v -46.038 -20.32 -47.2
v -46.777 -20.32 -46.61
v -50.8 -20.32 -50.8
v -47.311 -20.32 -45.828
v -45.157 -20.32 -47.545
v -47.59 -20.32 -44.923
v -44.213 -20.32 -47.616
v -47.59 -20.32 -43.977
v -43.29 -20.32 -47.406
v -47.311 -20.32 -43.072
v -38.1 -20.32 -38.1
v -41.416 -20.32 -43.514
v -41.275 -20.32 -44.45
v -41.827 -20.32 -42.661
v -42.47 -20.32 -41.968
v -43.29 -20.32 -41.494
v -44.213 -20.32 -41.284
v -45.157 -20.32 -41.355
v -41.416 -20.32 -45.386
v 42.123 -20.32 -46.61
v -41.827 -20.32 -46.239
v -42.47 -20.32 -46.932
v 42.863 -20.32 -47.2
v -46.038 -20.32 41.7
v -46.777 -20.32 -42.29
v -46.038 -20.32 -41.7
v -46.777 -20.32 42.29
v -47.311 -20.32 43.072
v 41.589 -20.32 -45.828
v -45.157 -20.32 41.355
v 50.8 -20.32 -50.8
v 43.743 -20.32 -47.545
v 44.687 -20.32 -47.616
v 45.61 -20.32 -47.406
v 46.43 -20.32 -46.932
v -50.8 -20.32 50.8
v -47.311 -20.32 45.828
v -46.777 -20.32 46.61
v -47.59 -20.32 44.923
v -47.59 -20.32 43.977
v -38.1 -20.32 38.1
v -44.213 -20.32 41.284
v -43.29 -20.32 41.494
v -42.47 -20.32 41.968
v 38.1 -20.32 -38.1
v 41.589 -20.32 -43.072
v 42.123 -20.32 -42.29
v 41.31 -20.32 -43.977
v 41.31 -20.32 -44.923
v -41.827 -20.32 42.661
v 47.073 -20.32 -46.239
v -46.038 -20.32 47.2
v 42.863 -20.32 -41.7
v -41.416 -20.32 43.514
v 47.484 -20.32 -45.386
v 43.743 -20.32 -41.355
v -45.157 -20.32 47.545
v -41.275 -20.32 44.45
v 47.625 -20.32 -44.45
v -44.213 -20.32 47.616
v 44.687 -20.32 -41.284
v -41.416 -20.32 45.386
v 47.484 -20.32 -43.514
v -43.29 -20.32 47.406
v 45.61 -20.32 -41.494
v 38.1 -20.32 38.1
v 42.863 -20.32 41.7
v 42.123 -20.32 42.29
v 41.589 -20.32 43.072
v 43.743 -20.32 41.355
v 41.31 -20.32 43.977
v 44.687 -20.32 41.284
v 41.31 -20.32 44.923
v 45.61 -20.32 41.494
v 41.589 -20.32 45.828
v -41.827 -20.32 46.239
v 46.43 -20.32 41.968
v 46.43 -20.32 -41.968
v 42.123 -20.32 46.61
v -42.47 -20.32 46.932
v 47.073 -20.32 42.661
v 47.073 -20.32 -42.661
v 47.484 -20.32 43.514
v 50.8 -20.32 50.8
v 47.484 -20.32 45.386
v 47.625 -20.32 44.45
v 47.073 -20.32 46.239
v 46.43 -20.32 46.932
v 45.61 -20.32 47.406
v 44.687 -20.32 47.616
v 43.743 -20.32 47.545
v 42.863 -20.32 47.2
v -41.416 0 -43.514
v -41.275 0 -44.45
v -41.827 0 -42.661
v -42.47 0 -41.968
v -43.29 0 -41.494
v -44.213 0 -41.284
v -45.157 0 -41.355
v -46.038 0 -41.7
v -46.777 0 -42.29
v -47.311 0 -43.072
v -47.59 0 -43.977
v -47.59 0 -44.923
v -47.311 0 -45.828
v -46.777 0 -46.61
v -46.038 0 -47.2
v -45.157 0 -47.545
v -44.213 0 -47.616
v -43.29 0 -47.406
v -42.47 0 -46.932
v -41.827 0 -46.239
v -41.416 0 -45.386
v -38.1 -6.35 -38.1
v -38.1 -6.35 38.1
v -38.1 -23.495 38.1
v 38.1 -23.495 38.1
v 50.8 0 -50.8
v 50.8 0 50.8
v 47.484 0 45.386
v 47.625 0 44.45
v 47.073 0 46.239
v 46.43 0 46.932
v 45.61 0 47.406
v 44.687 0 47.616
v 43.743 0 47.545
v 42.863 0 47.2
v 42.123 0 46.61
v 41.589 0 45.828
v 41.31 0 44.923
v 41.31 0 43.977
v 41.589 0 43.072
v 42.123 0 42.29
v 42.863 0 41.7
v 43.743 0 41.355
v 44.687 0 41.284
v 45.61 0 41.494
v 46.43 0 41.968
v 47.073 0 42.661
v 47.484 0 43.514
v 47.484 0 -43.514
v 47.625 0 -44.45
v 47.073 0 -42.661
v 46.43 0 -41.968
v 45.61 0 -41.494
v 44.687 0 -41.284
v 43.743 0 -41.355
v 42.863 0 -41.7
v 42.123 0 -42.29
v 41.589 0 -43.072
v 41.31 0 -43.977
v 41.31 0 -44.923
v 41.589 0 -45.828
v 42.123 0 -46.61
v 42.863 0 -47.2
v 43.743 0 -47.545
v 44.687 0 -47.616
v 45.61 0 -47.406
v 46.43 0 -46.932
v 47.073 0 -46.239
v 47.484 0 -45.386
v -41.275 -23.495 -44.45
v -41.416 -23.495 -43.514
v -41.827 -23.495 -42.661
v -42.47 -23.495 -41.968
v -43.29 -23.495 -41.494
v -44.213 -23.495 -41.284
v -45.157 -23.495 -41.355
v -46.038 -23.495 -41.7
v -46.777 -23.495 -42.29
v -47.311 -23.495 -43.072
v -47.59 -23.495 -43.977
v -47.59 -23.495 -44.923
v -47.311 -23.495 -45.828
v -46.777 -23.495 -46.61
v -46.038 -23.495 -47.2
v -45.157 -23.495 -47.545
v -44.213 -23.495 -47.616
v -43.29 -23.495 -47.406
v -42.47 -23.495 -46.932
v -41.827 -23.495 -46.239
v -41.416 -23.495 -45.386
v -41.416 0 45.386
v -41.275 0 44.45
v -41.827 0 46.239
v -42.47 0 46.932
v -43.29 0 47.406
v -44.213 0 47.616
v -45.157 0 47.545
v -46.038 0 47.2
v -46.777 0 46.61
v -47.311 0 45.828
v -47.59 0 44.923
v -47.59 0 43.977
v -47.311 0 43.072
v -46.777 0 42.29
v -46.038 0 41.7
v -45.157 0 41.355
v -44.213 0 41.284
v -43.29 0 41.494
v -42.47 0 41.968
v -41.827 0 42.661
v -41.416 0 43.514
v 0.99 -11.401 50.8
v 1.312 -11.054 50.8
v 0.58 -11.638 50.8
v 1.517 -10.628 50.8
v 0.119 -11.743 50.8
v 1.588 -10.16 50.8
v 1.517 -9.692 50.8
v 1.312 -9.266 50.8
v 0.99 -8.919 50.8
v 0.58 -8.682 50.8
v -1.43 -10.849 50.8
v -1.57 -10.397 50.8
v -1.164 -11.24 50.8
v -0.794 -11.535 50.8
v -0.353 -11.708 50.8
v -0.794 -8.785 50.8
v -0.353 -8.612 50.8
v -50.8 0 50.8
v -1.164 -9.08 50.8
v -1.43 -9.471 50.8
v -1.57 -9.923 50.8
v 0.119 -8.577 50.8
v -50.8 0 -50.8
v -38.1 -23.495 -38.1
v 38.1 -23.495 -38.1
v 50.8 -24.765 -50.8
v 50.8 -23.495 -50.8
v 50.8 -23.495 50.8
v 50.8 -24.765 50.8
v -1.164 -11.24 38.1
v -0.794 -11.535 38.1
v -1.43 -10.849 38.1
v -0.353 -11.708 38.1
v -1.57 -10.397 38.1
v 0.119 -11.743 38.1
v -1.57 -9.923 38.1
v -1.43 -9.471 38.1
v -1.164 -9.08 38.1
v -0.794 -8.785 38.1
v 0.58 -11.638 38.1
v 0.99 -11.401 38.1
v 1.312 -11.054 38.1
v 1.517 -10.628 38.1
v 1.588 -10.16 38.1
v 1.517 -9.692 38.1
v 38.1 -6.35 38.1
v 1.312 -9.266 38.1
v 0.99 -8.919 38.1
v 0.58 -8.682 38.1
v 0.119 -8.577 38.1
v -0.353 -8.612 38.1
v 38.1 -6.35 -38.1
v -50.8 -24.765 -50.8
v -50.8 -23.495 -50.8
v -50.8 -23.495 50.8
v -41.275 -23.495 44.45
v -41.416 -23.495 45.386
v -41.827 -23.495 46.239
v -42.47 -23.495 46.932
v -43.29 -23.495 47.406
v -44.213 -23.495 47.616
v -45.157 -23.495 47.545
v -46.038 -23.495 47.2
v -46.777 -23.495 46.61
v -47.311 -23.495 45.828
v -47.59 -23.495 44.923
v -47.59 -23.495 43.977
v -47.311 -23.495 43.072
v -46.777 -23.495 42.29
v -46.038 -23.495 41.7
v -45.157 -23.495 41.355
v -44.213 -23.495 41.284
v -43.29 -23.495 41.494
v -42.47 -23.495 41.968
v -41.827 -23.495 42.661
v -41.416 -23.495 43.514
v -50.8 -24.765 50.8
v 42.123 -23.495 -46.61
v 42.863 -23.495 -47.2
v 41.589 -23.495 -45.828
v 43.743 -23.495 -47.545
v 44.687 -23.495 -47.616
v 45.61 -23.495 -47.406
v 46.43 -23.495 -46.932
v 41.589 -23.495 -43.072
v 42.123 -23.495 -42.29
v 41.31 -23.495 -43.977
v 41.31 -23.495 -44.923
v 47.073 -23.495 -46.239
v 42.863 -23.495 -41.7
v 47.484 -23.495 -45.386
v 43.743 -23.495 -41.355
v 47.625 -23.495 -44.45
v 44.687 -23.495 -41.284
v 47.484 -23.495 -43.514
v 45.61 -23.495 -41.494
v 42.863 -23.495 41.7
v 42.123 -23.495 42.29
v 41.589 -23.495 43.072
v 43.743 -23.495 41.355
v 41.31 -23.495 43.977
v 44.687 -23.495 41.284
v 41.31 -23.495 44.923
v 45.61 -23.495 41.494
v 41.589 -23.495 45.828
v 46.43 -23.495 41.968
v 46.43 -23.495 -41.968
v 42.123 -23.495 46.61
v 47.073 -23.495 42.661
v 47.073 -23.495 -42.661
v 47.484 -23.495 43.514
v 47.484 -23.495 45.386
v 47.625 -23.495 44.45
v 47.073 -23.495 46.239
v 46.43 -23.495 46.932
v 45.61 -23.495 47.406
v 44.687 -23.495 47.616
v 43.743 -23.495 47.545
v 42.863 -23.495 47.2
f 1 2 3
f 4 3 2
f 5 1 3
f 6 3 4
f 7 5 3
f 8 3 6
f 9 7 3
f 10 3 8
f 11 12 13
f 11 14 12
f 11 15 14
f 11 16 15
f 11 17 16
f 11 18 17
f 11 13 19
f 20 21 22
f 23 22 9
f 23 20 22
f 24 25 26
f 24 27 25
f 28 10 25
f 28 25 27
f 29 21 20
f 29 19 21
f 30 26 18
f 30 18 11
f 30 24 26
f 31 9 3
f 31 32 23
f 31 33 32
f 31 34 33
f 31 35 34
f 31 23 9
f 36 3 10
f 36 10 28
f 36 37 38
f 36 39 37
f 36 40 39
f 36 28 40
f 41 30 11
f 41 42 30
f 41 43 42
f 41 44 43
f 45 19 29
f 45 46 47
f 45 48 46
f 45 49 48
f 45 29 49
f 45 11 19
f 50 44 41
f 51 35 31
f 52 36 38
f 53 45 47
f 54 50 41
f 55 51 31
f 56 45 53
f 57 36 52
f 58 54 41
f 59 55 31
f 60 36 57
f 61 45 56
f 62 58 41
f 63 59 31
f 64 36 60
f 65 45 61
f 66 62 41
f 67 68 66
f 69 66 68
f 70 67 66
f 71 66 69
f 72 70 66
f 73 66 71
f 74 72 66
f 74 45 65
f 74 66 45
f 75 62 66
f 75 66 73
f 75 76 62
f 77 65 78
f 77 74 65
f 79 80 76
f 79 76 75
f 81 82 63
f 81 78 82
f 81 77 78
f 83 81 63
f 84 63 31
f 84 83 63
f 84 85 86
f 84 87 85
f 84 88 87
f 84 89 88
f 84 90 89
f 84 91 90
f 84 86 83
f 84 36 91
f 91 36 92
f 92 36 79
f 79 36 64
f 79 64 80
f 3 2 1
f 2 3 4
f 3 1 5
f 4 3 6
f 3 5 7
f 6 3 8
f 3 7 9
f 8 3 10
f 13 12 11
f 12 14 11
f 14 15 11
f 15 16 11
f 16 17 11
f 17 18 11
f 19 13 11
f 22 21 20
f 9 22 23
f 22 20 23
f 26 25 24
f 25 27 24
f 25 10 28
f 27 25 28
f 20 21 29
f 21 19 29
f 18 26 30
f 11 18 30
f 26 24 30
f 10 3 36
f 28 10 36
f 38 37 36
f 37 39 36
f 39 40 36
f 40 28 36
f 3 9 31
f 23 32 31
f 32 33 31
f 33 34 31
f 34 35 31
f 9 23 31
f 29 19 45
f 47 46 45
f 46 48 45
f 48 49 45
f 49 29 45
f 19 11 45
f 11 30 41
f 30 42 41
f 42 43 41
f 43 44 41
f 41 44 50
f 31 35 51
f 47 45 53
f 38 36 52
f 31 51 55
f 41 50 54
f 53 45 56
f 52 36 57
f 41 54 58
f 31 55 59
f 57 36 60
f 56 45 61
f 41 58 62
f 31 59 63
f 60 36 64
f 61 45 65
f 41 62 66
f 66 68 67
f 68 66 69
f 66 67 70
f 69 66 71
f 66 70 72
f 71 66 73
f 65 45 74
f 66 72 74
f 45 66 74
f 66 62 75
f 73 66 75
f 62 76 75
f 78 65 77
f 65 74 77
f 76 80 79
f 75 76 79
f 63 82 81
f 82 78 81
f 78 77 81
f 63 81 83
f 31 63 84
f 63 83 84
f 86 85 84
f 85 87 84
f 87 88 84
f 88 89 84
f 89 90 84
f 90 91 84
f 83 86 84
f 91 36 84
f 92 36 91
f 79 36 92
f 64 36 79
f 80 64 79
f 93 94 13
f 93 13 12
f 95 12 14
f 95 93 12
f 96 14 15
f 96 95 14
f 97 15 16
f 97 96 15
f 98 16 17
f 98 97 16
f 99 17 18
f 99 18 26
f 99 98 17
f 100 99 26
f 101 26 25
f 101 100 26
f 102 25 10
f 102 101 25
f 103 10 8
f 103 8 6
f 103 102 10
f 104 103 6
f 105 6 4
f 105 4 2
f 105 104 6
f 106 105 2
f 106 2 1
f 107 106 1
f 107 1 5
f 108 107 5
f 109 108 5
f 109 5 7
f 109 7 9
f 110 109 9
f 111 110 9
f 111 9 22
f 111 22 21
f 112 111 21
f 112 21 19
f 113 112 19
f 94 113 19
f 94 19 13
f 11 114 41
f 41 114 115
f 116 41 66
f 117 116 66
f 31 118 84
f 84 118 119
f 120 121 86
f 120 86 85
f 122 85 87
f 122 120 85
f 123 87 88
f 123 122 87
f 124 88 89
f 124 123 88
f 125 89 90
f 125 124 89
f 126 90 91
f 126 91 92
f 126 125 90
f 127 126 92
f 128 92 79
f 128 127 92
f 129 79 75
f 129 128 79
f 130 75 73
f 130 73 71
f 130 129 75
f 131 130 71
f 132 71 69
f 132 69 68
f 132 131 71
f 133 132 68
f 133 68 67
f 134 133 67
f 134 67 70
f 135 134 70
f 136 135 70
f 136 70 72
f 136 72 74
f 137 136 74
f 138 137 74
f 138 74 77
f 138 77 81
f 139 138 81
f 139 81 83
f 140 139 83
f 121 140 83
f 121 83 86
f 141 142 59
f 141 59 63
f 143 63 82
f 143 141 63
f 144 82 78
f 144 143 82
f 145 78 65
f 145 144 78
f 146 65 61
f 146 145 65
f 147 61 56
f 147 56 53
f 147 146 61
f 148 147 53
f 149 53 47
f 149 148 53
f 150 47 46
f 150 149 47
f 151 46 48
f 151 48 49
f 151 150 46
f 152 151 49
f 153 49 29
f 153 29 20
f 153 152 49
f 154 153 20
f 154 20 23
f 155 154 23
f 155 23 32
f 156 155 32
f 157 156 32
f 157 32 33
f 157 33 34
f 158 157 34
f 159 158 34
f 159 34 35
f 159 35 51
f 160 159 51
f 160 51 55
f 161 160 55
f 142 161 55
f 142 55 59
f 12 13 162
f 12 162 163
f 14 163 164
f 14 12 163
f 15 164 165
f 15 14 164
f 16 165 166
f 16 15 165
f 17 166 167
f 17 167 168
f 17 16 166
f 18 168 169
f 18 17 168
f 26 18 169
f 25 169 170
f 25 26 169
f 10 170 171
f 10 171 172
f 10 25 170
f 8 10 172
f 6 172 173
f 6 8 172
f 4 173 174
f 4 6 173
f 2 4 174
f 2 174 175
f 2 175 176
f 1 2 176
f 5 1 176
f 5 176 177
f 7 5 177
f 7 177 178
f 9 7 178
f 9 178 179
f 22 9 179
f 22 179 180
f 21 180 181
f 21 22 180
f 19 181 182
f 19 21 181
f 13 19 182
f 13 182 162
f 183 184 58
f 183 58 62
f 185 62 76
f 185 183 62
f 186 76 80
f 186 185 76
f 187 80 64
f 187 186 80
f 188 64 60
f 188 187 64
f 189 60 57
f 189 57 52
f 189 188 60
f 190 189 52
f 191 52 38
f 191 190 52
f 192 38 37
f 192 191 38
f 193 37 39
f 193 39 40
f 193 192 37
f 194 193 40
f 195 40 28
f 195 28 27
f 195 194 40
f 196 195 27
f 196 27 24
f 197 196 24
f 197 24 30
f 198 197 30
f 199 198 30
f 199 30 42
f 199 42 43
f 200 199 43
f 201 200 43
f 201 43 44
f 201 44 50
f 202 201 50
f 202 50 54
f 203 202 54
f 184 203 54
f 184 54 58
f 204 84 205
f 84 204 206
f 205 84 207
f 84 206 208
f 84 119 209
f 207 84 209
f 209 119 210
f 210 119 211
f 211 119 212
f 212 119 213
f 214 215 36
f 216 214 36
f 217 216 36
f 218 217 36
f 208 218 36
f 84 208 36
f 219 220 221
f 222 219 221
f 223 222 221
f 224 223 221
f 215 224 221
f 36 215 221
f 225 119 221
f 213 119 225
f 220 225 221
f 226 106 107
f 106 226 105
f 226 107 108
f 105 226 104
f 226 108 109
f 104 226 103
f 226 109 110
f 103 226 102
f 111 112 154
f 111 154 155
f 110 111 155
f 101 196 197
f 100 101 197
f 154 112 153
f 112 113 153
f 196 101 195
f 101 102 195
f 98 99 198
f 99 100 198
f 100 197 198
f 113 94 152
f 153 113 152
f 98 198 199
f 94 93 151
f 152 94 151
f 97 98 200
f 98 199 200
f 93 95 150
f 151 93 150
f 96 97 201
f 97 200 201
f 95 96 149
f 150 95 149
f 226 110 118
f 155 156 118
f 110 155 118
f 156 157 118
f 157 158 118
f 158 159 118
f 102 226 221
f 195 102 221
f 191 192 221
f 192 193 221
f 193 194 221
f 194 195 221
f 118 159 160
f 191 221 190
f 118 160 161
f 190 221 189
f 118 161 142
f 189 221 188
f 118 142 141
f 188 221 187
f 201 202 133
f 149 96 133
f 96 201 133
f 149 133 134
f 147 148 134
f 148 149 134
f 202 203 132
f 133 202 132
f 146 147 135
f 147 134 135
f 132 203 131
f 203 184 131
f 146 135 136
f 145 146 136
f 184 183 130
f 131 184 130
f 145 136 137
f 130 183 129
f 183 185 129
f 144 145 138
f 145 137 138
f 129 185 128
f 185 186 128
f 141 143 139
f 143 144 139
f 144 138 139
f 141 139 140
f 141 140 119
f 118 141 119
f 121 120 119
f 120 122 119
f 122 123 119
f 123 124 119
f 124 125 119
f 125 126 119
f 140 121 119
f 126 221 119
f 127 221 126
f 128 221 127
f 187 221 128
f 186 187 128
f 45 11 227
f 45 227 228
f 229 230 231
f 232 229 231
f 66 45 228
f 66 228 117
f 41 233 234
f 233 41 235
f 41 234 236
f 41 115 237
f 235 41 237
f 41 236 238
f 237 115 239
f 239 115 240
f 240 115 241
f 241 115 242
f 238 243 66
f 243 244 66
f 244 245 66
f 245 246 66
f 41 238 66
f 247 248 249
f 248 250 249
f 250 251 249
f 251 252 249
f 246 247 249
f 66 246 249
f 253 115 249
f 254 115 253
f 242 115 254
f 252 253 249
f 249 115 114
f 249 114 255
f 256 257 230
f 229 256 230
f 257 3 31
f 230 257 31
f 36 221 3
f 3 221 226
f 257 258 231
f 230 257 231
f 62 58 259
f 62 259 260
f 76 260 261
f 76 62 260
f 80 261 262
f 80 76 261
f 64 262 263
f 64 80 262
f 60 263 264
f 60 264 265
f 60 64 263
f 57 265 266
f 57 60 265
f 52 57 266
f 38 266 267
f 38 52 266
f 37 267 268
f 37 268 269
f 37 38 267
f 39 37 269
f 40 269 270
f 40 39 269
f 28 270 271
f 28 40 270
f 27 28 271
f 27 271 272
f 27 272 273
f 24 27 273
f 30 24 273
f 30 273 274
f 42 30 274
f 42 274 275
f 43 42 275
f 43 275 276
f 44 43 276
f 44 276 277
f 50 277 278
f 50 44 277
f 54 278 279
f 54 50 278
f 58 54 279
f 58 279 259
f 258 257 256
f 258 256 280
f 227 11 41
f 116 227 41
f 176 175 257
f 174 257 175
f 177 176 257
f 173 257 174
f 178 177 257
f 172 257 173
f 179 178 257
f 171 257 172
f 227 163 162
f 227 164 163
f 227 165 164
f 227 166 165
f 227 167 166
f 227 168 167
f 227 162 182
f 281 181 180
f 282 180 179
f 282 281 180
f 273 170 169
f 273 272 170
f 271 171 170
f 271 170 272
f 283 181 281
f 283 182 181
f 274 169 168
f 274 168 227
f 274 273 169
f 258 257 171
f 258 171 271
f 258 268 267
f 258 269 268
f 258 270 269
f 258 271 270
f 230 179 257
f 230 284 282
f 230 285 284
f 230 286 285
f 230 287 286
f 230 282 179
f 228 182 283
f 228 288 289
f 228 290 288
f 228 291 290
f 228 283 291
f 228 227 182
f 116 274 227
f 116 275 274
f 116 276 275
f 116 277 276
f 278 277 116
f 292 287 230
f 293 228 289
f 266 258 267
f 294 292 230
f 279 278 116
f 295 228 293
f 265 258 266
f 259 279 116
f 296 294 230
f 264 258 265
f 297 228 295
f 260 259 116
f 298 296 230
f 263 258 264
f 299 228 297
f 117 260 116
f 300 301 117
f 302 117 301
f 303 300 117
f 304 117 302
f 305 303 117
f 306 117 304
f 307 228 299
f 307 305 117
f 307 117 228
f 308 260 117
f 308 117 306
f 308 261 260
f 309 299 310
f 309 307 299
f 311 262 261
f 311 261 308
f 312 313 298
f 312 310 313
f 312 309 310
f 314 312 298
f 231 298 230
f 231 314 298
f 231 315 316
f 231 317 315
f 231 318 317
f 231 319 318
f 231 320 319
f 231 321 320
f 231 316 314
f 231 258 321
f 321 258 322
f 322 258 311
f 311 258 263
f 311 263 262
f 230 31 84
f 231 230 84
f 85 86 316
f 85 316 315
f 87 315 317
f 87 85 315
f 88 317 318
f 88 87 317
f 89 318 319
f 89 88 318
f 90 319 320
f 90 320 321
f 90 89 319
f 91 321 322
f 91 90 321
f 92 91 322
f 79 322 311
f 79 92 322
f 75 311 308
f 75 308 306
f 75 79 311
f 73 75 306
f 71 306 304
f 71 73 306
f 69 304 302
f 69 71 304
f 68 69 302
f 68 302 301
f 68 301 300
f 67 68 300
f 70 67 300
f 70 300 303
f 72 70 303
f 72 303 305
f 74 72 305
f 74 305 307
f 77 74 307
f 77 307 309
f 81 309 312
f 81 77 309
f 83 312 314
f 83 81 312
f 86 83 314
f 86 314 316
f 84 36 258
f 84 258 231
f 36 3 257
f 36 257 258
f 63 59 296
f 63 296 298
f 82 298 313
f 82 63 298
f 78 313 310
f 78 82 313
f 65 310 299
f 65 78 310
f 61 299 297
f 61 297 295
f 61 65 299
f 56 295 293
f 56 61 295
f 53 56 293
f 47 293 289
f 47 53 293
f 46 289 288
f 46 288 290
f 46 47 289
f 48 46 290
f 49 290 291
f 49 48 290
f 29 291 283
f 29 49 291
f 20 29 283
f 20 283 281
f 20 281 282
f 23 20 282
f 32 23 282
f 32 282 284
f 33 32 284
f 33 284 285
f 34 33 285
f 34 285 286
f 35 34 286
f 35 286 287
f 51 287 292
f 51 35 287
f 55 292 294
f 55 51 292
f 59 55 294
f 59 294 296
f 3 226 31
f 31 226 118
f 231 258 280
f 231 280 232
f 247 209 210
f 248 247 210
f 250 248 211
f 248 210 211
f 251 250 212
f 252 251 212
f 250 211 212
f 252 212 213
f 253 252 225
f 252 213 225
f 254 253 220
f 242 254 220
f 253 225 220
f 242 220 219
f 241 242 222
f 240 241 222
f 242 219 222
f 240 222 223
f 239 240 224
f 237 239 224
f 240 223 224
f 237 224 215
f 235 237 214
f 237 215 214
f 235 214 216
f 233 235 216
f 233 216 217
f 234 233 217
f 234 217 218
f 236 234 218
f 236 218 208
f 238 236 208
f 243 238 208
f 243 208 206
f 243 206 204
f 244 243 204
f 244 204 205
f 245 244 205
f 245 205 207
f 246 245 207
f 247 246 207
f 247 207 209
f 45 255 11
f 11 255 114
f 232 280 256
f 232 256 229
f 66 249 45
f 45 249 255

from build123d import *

# Parameters (mm, degrees)
F0_R     = 3.175
F0_W     = 12.7
F0_H     = 12.7
F1_DEPTH = 6.35
F2_DEPTH = 20.32
F3_R     = 1.5875
F4_DEPTH = 25.4
F5_W     = 101.6
F5_H     = 101.6
F5_R     = 3.175
F5_W_2   = 76.2
F5_H_2   = 76.2
F6_DEPTH = 3.175
F7_W     = 101.6
F7_H     = 101.6
F7_R     = 3.175
F7_W_2   = 76.2
F7_H_2   = 76.2
F8_DEPTH = 1.27


# Not quite as in the source:
# - a feature names something its author has since deleted; it is built from what else it names


with BuildPart() as f1:
    # F0 (on Front) → F1 (new body)
    with BuildSketch(Plane.XZ):
        Polygon((38.1, 38.1), (38.1, 0), (38.1, -38.1), (-38.1, -38.1), (-38.1, 0), (-38.1, 38.1), (-50.8, 38.1), (-50.8, -50.8), (50.8, -50.8), (50.8, 38.1), align=None)
        with Locations((-44.45, -44.45)):
            Circle(F0_R, mode=Mode.SUBTRACT)
        with Locations((44.45, -44.45)):
            Circle(F0_R, mode=Mode.SUBTRACT)
        Polygon((38.1, -38.1), (38.1, 0), (38.1, 38.1), (0, 38.1), (-38.1, 38.1), (-38.1, 0), (-38.1, -38.1), align=None)
        Polygon((0, 38.1), (38.1, 38.1), (38.1, 50.8), (-38.1, 50.8), (-38.1, 38.1), align=None)
        with Locations((-44.45, 44.45)):
            Rectangle(F0_W, F0_H)
        with Locations((-44.45, 44.45)):
            Circle(F0_R, mode=Mode.SUBTRACT)
        with Locations((44.45, 44.45)):
            Rectangle(F0_W, F0_H)
        with Locations((44.45, 44.45)):
            Circle(F0_R, mode=Mode.SUBTRACT)
    extrude(amount=F1_DEPTH)

    # F0 (on Front) → F2 (join)
    with BuildSketch(Plane.XZ):
        Polygon((38.1, 38.1), (38.1, 0), (38.1, -38.1), (-38.1, -38.1), (-38.1, 0), (-38.1, 38.1), (-50.8, 38.1), (-50.8, -50.8), (50.8, -50.8), (50.8, 38.1), align=None)
        with Locations((-44.45, -44.45)):
            Circle(F0_R, mode=Mode.SUBTRACT)
        with Locations((44.45, -44.45)):
            Circle(F0_R, mode=Mode.SUBTRACT)
        Polygon((0, 38.1), (38.1, 38.1), (38.1, 50.8), (-38.1, 50.8), (-38.1, 38.1), align=None)
        with Locations((44.45, 44.45)):
            Rectangle(F0_W, F0_H)
        with Locations((44.45, 44.45)):
            Circle(F0_R, mode=Mode.SUBTRACT)
        with Locations((-44.45, 44.45)):
            Rectangle(F0_W, F0_H)
        with Locations((-44.45, 44.45)):
            Circle(F0_R, mode=Mode.SUBTRACT)
    extrude(amount=F2_DEPTH)

    # F3 (on face) → F4 (cut)
    with BuildSketch(Plane.XY.offset(50.8)):
        with Locations((0, -10.16)):
            Circle(F3_R)
    extrude(amount=-F4_DEPTH, mode=Mode.SUBTRACT)


with BuildPart() as f6:
    # F5 (on face) → F6 (new body)
    with BuildSketch(Plane.XZ.offset(20.32)):
        Rectangle(F5_W, F5_H)
        with Locations((-44.45, -44.45)):
            Circle(F5_R, mode=Mode.SUBTRACT)
        Rectangle(F5_W_2, F5_H_2, mode=Mode.SUBTRACT)
        with Locations((44.45, -44.45)):
            Circle(F5_R, mode=Mode.SUBTRACT)
        with Locations((-44.45, 44.45)):
            Circle(F5_R, mode=Mode.SUBTRACT)
        with Locations((44.45, 44.45)):
            Circle(F5_R, mode=Mode.SUBTRACT)
    extrude(amount=F6_DEPTH)


with BuildPart() as f8:
    # F7 (on face) → F8 (new body)
    with BuildSketch(Plane.XZ.offset(23.495)):
        Rectangle(F7_W, F7_H)
        with Locations((-44.45, -44.45)):
            Circle(F7_R, mode=Mode.SUBTRACT)
        Rectangle(F7_W_2, F7_H_2, mode=Mode.SUBTRACT)
        with Locations((44.45, -44.45)):
            Circle(F7_R, mode=Mode.SUBTRACT)
        with Locations((-44.45, 44.45)):
            Circle(F7_R, mode=Mode.SUBTRACT)
        with Locations((44.45, 44.45)):
            Circle(F7_R, mode=Mode.SUBTRACT)
        with Locations((-44.45, -44.45)):
            Circle(F7_R)
        Rectangle(F7_W_2, F7_H_2)
        with Locations((44.45, -44.45)):
            Circle(F7_R)
        with Locations((-44.45, 44.45)):
            Circle(F7_R)
        with Locations((44.45, 44.45)):
            Circle(F7_R)
    extrude(amount=F8_DEPTH)


solid = Compound([f1.part, f6.part, f8.part])
